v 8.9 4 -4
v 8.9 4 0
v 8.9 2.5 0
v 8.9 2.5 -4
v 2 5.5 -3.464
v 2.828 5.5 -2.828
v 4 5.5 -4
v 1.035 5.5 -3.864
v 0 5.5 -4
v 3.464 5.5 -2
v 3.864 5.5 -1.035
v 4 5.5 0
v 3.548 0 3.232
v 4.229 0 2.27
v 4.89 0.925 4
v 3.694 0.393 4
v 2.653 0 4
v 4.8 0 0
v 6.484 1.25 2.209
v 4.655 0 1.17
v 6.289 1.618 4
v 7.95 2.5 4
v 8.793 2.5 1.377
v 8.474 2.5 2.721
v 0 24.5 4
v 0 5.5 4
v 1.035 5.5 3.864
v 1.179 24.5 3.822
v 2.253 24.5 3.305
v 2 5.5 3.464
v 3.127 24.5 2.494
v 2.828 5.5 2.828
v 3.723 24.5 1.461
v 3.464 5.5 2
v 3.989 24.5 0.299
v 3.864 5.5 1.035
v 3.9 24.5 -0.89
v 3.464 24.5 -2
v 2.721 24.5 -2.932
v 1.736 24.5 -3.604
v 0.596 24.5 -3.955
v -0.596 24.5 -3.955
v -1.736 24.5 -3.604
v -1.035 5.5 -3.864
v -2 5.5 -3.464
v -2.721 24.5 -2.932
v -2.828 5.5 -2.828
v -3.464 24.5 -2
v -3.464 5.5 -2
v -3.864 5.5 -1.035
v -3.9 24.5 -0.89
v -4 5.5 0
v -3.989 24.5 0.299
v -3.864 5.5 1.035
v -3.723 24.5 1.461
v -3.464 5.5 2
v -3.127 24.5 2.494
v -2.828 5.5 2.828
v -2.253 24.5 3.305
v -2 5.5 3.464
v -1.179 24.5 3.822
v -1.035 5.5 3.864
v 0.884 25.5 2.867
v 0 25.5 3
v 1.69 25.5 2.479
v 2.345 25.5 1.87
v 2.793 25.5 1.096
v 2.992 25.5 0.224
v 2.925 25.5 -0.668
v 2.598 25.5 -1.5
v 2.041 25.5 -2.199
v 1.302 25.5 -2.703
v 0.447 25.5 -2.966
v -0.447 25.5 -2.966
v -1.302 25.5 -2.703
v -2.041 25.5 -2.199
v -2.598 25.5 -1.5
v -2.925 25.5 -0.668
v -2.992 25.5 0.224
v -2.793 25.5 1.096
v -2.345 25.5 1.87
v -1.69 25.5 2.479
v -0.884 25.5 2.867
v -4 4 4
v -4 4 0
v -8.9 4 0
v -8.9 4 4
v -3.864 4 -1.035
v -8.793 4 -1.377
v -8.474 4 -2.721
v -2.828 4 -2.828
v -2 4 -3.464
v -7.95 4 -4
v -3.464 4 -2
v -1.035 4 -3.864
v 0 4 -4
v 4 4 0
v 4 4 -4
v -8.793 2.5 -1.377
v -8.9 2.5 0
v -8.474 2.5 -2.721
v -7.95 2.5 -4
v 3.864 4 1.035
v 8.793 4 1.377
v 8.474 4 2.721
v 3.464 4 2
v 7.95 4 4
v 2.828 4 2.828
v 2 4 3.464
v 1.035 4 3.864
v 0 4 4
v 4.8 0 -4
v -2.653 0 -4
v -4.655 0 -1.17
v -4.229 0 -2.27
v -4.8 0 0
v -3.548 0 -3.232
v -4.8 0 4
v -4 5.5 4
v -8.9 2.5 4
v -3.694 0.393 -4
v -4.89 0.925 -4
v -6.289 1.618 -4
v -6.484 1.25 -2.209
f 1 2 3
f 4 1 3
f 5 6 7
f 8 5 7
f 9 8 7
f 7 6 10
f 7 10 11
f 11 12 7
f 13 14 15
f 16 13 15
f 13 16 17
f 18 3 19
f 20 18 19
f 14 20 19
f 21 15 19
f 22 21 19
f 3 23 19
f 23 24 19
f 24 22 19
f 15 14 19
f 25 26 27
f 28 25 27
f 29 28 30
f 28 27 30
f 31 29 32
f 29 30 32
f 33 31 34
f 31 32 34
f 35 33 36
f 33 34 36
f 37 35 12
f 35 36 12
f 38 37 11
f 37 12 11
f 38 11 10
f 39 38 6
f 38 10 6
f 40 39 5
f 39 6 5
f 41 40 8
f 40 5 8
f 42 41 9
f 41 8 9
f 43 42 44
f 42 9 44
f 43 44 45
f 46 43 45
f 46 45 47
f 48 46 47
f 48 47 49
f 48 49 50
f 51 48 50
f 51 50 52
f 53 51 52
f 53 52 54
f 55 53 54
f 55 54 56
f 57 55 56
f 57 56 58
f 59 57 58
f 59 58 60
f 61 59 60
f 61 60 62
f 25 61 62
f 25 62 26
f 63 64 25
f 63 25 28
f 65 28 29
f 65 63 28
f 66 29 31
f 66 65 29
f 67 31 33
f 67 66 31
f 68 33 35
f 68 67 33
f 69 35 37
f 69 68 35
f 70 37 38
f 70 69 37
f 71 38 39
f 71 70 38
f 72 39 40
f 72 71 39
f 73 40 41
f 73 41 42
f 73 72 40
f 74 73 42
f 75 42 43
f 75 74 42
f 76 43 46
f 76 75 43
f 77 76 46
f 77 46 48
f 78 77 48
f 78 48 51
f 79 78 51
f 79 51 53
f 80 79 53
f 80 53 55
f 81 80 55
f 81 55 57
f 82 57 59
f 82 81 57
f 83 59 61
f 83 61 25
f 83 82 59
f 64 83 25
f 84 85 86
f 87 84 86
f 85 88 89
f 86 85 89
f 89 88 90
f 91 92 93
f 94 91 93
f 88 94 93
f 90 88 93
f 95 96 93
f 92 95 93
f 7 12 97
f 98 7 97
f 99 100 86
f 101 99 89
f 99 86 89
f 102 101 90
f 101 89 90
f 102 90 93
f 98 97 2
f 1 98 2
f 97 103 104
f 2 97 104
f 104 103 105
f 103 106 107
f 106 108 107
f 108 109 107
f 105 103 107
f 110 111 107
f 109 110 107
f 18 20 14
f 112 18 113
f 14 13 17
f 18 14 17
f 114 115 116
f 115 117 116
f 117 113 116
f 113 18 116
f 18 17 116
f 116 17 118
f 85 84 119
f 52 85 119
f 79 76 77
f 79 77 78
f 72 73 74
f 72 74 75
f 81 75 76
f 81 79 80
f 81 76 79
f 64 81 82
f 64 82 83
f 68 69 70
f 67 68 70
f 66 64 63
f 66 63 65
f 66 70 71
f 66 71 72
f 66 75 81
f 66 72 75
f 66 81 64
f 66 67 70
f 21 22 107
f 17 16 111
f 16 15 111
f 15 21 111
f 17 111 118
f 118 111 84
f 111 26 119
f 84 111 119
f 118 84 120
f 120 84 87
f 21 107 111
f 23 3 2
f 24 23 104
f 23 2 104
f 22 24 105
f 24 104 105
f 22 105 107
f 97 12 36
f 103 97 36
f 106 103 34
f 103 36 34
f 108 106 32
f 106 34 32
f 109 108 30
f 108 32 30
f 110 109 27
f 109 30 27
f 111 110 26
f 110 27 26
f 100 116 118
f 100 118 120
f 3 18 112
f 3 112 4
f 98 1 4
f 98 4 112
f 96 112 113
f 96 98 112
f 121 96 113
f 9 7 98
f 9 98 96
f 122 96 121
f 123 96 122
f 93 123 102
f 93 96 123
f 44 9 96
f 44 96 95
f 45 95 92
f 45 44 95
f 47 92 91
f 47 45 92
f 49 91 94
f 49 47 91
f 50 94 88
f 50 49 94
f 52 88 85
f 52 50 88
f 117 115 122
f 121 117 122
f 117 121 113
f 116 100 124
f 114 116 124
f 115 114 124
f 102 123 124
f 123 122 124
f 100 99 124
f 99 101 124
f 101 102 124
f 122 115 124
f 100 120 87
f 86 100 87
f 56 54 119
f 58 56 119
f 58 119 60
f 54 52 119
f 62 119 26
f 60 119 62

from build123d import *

# Parameters (mm, degrees)
EXTRUDE_1_DEPTH     = 4
CUT_EXTRUDE_1_DEPTH = 1.5
SKETCH_2_R          = 4
EXTRUDE_2_DEPTH     = 20
CUT_EXTRUDE_2_DEPTH = 5
CHAMFER_2_SIZE      = 1


with BuildPart() as part:
    # Эскиз1 → Бобышка-Вытянуть1 (new body, symmetric)
    with BuildSketch(Plane.XY):
        Polygon((8.9, 0), (-8.9, 0), (-8.9, 4), (-4, 4), (-4, 5.5), (4, 5.5), (4, 4), (8.9, 4), align=None)
    extrude(amount=EXTRUDE_1_DEPTH, both=True)

    # Эскиз3 → Вырез-Вытянуть1 (cut)
    with BuildSketch(Plane(origin=(0, 5.5, 0), x_dir=(1, 0, 0), z_dir=(0, 1, 0))):
        with BuildLine():
            Line((-4, 0), (-4, 4))
            Line((-4, 4), (0, 4))
            ThreePointArc((0, 4), (-2.828427125, 2.828427125), (-4, 0))
        make_face()
        with BuildLine():
            Line((0, -4), (4, -4))
            Line((4, -4), (4, 0))
            ThreePointArc((4, 0), (2.828427125, -2.828427125), (0, -4))
        make_face()
    extrude(amount=-CUT_EXTRUDE_1_DEPTH, mode=Mode.SUBTRACT)

    # Эскиз2 → Бобышка-Вытянуть2 (add)
    with BuildSketch(Plane(origin=(0, 5.5, 0), x_dir=(1, 0, 0), z_dir=(0, 1, 0))):
        with Locations(Location((0, 0, 0), (0, 0, 270))):  # turned: the seam where the file's is
            Circle(SKETCH_2_R)
    extrude(amount=EXTRUDE_2_DEPTH)

    # Эскиз4 → Вырез-Вытянуть2 (cut, through all)
    with BuildSketch(Plane(origin=(0, 4, 0), x_dir=(1, 0, 0), z_dir=(0, 1, 0))):
        with BuildLine():
            Line((-7.950471684, 4), (-8.9, 4))
            Line((-8.9, 4), (-8.9, 0))
            ThreePointArc((-8.9, 0), (-8.659364815, 2.055578022), (-7.950471684, 4))
        make_face()
        with BuildLine():
            Line((7.950471684, -4), (8.9, -4))
            Line((8.9, -4), (8.9, 0))
            ThreePointArc((8.9, 0), (8.659364815, -2.055578022), (7.950471684, -4))
        make_face()
    extrude(amount=-CUT_EXTRUDE_2_DEPTH, mode=Mode.SUBTRACT)

    # Вырез-По траектории1: sweep along a path in Эскиз6
    with BuildLine(Plane.XZ) as sweep_1_path:
        Line((0, -8.9), (8.9, -8.9))
        Line((8.9, -8.9), (8.9, 0))
        ThreePointArc((8.9, 0), (6.293250353, 6.293250353), (0, 8.9))
        Line((0, 8.9), (-8.9, 8.9))
        Line((-8.9, 8.9), (-8.9, 0))
        ThreePointArc((-8.9, 0), (-6.293250353, -6.293250353), (0, -8.9))
    # Эскиз5 → Вырез-По траектории1 (sweep, cut)
    with BuildSketch(Plane.XY.offset(4)):
        Polygon((-8.9, 2.5), (-4.8, 0), (-8.9, 0), align=None)
    sweep(path=sweep_1_path.line, transition=Transition.RIGHT, mode=Mode.SUBTRACT)

    # Фаска2
    chamfer_2_edges = [part.edges().sort_by_distance(p)[0] for p in [
        (0, 25.5, -4),
    ]]
    chamfer(chamfer_2_edges, length=CHAMFER_2_SIZE)


solid = part.part
